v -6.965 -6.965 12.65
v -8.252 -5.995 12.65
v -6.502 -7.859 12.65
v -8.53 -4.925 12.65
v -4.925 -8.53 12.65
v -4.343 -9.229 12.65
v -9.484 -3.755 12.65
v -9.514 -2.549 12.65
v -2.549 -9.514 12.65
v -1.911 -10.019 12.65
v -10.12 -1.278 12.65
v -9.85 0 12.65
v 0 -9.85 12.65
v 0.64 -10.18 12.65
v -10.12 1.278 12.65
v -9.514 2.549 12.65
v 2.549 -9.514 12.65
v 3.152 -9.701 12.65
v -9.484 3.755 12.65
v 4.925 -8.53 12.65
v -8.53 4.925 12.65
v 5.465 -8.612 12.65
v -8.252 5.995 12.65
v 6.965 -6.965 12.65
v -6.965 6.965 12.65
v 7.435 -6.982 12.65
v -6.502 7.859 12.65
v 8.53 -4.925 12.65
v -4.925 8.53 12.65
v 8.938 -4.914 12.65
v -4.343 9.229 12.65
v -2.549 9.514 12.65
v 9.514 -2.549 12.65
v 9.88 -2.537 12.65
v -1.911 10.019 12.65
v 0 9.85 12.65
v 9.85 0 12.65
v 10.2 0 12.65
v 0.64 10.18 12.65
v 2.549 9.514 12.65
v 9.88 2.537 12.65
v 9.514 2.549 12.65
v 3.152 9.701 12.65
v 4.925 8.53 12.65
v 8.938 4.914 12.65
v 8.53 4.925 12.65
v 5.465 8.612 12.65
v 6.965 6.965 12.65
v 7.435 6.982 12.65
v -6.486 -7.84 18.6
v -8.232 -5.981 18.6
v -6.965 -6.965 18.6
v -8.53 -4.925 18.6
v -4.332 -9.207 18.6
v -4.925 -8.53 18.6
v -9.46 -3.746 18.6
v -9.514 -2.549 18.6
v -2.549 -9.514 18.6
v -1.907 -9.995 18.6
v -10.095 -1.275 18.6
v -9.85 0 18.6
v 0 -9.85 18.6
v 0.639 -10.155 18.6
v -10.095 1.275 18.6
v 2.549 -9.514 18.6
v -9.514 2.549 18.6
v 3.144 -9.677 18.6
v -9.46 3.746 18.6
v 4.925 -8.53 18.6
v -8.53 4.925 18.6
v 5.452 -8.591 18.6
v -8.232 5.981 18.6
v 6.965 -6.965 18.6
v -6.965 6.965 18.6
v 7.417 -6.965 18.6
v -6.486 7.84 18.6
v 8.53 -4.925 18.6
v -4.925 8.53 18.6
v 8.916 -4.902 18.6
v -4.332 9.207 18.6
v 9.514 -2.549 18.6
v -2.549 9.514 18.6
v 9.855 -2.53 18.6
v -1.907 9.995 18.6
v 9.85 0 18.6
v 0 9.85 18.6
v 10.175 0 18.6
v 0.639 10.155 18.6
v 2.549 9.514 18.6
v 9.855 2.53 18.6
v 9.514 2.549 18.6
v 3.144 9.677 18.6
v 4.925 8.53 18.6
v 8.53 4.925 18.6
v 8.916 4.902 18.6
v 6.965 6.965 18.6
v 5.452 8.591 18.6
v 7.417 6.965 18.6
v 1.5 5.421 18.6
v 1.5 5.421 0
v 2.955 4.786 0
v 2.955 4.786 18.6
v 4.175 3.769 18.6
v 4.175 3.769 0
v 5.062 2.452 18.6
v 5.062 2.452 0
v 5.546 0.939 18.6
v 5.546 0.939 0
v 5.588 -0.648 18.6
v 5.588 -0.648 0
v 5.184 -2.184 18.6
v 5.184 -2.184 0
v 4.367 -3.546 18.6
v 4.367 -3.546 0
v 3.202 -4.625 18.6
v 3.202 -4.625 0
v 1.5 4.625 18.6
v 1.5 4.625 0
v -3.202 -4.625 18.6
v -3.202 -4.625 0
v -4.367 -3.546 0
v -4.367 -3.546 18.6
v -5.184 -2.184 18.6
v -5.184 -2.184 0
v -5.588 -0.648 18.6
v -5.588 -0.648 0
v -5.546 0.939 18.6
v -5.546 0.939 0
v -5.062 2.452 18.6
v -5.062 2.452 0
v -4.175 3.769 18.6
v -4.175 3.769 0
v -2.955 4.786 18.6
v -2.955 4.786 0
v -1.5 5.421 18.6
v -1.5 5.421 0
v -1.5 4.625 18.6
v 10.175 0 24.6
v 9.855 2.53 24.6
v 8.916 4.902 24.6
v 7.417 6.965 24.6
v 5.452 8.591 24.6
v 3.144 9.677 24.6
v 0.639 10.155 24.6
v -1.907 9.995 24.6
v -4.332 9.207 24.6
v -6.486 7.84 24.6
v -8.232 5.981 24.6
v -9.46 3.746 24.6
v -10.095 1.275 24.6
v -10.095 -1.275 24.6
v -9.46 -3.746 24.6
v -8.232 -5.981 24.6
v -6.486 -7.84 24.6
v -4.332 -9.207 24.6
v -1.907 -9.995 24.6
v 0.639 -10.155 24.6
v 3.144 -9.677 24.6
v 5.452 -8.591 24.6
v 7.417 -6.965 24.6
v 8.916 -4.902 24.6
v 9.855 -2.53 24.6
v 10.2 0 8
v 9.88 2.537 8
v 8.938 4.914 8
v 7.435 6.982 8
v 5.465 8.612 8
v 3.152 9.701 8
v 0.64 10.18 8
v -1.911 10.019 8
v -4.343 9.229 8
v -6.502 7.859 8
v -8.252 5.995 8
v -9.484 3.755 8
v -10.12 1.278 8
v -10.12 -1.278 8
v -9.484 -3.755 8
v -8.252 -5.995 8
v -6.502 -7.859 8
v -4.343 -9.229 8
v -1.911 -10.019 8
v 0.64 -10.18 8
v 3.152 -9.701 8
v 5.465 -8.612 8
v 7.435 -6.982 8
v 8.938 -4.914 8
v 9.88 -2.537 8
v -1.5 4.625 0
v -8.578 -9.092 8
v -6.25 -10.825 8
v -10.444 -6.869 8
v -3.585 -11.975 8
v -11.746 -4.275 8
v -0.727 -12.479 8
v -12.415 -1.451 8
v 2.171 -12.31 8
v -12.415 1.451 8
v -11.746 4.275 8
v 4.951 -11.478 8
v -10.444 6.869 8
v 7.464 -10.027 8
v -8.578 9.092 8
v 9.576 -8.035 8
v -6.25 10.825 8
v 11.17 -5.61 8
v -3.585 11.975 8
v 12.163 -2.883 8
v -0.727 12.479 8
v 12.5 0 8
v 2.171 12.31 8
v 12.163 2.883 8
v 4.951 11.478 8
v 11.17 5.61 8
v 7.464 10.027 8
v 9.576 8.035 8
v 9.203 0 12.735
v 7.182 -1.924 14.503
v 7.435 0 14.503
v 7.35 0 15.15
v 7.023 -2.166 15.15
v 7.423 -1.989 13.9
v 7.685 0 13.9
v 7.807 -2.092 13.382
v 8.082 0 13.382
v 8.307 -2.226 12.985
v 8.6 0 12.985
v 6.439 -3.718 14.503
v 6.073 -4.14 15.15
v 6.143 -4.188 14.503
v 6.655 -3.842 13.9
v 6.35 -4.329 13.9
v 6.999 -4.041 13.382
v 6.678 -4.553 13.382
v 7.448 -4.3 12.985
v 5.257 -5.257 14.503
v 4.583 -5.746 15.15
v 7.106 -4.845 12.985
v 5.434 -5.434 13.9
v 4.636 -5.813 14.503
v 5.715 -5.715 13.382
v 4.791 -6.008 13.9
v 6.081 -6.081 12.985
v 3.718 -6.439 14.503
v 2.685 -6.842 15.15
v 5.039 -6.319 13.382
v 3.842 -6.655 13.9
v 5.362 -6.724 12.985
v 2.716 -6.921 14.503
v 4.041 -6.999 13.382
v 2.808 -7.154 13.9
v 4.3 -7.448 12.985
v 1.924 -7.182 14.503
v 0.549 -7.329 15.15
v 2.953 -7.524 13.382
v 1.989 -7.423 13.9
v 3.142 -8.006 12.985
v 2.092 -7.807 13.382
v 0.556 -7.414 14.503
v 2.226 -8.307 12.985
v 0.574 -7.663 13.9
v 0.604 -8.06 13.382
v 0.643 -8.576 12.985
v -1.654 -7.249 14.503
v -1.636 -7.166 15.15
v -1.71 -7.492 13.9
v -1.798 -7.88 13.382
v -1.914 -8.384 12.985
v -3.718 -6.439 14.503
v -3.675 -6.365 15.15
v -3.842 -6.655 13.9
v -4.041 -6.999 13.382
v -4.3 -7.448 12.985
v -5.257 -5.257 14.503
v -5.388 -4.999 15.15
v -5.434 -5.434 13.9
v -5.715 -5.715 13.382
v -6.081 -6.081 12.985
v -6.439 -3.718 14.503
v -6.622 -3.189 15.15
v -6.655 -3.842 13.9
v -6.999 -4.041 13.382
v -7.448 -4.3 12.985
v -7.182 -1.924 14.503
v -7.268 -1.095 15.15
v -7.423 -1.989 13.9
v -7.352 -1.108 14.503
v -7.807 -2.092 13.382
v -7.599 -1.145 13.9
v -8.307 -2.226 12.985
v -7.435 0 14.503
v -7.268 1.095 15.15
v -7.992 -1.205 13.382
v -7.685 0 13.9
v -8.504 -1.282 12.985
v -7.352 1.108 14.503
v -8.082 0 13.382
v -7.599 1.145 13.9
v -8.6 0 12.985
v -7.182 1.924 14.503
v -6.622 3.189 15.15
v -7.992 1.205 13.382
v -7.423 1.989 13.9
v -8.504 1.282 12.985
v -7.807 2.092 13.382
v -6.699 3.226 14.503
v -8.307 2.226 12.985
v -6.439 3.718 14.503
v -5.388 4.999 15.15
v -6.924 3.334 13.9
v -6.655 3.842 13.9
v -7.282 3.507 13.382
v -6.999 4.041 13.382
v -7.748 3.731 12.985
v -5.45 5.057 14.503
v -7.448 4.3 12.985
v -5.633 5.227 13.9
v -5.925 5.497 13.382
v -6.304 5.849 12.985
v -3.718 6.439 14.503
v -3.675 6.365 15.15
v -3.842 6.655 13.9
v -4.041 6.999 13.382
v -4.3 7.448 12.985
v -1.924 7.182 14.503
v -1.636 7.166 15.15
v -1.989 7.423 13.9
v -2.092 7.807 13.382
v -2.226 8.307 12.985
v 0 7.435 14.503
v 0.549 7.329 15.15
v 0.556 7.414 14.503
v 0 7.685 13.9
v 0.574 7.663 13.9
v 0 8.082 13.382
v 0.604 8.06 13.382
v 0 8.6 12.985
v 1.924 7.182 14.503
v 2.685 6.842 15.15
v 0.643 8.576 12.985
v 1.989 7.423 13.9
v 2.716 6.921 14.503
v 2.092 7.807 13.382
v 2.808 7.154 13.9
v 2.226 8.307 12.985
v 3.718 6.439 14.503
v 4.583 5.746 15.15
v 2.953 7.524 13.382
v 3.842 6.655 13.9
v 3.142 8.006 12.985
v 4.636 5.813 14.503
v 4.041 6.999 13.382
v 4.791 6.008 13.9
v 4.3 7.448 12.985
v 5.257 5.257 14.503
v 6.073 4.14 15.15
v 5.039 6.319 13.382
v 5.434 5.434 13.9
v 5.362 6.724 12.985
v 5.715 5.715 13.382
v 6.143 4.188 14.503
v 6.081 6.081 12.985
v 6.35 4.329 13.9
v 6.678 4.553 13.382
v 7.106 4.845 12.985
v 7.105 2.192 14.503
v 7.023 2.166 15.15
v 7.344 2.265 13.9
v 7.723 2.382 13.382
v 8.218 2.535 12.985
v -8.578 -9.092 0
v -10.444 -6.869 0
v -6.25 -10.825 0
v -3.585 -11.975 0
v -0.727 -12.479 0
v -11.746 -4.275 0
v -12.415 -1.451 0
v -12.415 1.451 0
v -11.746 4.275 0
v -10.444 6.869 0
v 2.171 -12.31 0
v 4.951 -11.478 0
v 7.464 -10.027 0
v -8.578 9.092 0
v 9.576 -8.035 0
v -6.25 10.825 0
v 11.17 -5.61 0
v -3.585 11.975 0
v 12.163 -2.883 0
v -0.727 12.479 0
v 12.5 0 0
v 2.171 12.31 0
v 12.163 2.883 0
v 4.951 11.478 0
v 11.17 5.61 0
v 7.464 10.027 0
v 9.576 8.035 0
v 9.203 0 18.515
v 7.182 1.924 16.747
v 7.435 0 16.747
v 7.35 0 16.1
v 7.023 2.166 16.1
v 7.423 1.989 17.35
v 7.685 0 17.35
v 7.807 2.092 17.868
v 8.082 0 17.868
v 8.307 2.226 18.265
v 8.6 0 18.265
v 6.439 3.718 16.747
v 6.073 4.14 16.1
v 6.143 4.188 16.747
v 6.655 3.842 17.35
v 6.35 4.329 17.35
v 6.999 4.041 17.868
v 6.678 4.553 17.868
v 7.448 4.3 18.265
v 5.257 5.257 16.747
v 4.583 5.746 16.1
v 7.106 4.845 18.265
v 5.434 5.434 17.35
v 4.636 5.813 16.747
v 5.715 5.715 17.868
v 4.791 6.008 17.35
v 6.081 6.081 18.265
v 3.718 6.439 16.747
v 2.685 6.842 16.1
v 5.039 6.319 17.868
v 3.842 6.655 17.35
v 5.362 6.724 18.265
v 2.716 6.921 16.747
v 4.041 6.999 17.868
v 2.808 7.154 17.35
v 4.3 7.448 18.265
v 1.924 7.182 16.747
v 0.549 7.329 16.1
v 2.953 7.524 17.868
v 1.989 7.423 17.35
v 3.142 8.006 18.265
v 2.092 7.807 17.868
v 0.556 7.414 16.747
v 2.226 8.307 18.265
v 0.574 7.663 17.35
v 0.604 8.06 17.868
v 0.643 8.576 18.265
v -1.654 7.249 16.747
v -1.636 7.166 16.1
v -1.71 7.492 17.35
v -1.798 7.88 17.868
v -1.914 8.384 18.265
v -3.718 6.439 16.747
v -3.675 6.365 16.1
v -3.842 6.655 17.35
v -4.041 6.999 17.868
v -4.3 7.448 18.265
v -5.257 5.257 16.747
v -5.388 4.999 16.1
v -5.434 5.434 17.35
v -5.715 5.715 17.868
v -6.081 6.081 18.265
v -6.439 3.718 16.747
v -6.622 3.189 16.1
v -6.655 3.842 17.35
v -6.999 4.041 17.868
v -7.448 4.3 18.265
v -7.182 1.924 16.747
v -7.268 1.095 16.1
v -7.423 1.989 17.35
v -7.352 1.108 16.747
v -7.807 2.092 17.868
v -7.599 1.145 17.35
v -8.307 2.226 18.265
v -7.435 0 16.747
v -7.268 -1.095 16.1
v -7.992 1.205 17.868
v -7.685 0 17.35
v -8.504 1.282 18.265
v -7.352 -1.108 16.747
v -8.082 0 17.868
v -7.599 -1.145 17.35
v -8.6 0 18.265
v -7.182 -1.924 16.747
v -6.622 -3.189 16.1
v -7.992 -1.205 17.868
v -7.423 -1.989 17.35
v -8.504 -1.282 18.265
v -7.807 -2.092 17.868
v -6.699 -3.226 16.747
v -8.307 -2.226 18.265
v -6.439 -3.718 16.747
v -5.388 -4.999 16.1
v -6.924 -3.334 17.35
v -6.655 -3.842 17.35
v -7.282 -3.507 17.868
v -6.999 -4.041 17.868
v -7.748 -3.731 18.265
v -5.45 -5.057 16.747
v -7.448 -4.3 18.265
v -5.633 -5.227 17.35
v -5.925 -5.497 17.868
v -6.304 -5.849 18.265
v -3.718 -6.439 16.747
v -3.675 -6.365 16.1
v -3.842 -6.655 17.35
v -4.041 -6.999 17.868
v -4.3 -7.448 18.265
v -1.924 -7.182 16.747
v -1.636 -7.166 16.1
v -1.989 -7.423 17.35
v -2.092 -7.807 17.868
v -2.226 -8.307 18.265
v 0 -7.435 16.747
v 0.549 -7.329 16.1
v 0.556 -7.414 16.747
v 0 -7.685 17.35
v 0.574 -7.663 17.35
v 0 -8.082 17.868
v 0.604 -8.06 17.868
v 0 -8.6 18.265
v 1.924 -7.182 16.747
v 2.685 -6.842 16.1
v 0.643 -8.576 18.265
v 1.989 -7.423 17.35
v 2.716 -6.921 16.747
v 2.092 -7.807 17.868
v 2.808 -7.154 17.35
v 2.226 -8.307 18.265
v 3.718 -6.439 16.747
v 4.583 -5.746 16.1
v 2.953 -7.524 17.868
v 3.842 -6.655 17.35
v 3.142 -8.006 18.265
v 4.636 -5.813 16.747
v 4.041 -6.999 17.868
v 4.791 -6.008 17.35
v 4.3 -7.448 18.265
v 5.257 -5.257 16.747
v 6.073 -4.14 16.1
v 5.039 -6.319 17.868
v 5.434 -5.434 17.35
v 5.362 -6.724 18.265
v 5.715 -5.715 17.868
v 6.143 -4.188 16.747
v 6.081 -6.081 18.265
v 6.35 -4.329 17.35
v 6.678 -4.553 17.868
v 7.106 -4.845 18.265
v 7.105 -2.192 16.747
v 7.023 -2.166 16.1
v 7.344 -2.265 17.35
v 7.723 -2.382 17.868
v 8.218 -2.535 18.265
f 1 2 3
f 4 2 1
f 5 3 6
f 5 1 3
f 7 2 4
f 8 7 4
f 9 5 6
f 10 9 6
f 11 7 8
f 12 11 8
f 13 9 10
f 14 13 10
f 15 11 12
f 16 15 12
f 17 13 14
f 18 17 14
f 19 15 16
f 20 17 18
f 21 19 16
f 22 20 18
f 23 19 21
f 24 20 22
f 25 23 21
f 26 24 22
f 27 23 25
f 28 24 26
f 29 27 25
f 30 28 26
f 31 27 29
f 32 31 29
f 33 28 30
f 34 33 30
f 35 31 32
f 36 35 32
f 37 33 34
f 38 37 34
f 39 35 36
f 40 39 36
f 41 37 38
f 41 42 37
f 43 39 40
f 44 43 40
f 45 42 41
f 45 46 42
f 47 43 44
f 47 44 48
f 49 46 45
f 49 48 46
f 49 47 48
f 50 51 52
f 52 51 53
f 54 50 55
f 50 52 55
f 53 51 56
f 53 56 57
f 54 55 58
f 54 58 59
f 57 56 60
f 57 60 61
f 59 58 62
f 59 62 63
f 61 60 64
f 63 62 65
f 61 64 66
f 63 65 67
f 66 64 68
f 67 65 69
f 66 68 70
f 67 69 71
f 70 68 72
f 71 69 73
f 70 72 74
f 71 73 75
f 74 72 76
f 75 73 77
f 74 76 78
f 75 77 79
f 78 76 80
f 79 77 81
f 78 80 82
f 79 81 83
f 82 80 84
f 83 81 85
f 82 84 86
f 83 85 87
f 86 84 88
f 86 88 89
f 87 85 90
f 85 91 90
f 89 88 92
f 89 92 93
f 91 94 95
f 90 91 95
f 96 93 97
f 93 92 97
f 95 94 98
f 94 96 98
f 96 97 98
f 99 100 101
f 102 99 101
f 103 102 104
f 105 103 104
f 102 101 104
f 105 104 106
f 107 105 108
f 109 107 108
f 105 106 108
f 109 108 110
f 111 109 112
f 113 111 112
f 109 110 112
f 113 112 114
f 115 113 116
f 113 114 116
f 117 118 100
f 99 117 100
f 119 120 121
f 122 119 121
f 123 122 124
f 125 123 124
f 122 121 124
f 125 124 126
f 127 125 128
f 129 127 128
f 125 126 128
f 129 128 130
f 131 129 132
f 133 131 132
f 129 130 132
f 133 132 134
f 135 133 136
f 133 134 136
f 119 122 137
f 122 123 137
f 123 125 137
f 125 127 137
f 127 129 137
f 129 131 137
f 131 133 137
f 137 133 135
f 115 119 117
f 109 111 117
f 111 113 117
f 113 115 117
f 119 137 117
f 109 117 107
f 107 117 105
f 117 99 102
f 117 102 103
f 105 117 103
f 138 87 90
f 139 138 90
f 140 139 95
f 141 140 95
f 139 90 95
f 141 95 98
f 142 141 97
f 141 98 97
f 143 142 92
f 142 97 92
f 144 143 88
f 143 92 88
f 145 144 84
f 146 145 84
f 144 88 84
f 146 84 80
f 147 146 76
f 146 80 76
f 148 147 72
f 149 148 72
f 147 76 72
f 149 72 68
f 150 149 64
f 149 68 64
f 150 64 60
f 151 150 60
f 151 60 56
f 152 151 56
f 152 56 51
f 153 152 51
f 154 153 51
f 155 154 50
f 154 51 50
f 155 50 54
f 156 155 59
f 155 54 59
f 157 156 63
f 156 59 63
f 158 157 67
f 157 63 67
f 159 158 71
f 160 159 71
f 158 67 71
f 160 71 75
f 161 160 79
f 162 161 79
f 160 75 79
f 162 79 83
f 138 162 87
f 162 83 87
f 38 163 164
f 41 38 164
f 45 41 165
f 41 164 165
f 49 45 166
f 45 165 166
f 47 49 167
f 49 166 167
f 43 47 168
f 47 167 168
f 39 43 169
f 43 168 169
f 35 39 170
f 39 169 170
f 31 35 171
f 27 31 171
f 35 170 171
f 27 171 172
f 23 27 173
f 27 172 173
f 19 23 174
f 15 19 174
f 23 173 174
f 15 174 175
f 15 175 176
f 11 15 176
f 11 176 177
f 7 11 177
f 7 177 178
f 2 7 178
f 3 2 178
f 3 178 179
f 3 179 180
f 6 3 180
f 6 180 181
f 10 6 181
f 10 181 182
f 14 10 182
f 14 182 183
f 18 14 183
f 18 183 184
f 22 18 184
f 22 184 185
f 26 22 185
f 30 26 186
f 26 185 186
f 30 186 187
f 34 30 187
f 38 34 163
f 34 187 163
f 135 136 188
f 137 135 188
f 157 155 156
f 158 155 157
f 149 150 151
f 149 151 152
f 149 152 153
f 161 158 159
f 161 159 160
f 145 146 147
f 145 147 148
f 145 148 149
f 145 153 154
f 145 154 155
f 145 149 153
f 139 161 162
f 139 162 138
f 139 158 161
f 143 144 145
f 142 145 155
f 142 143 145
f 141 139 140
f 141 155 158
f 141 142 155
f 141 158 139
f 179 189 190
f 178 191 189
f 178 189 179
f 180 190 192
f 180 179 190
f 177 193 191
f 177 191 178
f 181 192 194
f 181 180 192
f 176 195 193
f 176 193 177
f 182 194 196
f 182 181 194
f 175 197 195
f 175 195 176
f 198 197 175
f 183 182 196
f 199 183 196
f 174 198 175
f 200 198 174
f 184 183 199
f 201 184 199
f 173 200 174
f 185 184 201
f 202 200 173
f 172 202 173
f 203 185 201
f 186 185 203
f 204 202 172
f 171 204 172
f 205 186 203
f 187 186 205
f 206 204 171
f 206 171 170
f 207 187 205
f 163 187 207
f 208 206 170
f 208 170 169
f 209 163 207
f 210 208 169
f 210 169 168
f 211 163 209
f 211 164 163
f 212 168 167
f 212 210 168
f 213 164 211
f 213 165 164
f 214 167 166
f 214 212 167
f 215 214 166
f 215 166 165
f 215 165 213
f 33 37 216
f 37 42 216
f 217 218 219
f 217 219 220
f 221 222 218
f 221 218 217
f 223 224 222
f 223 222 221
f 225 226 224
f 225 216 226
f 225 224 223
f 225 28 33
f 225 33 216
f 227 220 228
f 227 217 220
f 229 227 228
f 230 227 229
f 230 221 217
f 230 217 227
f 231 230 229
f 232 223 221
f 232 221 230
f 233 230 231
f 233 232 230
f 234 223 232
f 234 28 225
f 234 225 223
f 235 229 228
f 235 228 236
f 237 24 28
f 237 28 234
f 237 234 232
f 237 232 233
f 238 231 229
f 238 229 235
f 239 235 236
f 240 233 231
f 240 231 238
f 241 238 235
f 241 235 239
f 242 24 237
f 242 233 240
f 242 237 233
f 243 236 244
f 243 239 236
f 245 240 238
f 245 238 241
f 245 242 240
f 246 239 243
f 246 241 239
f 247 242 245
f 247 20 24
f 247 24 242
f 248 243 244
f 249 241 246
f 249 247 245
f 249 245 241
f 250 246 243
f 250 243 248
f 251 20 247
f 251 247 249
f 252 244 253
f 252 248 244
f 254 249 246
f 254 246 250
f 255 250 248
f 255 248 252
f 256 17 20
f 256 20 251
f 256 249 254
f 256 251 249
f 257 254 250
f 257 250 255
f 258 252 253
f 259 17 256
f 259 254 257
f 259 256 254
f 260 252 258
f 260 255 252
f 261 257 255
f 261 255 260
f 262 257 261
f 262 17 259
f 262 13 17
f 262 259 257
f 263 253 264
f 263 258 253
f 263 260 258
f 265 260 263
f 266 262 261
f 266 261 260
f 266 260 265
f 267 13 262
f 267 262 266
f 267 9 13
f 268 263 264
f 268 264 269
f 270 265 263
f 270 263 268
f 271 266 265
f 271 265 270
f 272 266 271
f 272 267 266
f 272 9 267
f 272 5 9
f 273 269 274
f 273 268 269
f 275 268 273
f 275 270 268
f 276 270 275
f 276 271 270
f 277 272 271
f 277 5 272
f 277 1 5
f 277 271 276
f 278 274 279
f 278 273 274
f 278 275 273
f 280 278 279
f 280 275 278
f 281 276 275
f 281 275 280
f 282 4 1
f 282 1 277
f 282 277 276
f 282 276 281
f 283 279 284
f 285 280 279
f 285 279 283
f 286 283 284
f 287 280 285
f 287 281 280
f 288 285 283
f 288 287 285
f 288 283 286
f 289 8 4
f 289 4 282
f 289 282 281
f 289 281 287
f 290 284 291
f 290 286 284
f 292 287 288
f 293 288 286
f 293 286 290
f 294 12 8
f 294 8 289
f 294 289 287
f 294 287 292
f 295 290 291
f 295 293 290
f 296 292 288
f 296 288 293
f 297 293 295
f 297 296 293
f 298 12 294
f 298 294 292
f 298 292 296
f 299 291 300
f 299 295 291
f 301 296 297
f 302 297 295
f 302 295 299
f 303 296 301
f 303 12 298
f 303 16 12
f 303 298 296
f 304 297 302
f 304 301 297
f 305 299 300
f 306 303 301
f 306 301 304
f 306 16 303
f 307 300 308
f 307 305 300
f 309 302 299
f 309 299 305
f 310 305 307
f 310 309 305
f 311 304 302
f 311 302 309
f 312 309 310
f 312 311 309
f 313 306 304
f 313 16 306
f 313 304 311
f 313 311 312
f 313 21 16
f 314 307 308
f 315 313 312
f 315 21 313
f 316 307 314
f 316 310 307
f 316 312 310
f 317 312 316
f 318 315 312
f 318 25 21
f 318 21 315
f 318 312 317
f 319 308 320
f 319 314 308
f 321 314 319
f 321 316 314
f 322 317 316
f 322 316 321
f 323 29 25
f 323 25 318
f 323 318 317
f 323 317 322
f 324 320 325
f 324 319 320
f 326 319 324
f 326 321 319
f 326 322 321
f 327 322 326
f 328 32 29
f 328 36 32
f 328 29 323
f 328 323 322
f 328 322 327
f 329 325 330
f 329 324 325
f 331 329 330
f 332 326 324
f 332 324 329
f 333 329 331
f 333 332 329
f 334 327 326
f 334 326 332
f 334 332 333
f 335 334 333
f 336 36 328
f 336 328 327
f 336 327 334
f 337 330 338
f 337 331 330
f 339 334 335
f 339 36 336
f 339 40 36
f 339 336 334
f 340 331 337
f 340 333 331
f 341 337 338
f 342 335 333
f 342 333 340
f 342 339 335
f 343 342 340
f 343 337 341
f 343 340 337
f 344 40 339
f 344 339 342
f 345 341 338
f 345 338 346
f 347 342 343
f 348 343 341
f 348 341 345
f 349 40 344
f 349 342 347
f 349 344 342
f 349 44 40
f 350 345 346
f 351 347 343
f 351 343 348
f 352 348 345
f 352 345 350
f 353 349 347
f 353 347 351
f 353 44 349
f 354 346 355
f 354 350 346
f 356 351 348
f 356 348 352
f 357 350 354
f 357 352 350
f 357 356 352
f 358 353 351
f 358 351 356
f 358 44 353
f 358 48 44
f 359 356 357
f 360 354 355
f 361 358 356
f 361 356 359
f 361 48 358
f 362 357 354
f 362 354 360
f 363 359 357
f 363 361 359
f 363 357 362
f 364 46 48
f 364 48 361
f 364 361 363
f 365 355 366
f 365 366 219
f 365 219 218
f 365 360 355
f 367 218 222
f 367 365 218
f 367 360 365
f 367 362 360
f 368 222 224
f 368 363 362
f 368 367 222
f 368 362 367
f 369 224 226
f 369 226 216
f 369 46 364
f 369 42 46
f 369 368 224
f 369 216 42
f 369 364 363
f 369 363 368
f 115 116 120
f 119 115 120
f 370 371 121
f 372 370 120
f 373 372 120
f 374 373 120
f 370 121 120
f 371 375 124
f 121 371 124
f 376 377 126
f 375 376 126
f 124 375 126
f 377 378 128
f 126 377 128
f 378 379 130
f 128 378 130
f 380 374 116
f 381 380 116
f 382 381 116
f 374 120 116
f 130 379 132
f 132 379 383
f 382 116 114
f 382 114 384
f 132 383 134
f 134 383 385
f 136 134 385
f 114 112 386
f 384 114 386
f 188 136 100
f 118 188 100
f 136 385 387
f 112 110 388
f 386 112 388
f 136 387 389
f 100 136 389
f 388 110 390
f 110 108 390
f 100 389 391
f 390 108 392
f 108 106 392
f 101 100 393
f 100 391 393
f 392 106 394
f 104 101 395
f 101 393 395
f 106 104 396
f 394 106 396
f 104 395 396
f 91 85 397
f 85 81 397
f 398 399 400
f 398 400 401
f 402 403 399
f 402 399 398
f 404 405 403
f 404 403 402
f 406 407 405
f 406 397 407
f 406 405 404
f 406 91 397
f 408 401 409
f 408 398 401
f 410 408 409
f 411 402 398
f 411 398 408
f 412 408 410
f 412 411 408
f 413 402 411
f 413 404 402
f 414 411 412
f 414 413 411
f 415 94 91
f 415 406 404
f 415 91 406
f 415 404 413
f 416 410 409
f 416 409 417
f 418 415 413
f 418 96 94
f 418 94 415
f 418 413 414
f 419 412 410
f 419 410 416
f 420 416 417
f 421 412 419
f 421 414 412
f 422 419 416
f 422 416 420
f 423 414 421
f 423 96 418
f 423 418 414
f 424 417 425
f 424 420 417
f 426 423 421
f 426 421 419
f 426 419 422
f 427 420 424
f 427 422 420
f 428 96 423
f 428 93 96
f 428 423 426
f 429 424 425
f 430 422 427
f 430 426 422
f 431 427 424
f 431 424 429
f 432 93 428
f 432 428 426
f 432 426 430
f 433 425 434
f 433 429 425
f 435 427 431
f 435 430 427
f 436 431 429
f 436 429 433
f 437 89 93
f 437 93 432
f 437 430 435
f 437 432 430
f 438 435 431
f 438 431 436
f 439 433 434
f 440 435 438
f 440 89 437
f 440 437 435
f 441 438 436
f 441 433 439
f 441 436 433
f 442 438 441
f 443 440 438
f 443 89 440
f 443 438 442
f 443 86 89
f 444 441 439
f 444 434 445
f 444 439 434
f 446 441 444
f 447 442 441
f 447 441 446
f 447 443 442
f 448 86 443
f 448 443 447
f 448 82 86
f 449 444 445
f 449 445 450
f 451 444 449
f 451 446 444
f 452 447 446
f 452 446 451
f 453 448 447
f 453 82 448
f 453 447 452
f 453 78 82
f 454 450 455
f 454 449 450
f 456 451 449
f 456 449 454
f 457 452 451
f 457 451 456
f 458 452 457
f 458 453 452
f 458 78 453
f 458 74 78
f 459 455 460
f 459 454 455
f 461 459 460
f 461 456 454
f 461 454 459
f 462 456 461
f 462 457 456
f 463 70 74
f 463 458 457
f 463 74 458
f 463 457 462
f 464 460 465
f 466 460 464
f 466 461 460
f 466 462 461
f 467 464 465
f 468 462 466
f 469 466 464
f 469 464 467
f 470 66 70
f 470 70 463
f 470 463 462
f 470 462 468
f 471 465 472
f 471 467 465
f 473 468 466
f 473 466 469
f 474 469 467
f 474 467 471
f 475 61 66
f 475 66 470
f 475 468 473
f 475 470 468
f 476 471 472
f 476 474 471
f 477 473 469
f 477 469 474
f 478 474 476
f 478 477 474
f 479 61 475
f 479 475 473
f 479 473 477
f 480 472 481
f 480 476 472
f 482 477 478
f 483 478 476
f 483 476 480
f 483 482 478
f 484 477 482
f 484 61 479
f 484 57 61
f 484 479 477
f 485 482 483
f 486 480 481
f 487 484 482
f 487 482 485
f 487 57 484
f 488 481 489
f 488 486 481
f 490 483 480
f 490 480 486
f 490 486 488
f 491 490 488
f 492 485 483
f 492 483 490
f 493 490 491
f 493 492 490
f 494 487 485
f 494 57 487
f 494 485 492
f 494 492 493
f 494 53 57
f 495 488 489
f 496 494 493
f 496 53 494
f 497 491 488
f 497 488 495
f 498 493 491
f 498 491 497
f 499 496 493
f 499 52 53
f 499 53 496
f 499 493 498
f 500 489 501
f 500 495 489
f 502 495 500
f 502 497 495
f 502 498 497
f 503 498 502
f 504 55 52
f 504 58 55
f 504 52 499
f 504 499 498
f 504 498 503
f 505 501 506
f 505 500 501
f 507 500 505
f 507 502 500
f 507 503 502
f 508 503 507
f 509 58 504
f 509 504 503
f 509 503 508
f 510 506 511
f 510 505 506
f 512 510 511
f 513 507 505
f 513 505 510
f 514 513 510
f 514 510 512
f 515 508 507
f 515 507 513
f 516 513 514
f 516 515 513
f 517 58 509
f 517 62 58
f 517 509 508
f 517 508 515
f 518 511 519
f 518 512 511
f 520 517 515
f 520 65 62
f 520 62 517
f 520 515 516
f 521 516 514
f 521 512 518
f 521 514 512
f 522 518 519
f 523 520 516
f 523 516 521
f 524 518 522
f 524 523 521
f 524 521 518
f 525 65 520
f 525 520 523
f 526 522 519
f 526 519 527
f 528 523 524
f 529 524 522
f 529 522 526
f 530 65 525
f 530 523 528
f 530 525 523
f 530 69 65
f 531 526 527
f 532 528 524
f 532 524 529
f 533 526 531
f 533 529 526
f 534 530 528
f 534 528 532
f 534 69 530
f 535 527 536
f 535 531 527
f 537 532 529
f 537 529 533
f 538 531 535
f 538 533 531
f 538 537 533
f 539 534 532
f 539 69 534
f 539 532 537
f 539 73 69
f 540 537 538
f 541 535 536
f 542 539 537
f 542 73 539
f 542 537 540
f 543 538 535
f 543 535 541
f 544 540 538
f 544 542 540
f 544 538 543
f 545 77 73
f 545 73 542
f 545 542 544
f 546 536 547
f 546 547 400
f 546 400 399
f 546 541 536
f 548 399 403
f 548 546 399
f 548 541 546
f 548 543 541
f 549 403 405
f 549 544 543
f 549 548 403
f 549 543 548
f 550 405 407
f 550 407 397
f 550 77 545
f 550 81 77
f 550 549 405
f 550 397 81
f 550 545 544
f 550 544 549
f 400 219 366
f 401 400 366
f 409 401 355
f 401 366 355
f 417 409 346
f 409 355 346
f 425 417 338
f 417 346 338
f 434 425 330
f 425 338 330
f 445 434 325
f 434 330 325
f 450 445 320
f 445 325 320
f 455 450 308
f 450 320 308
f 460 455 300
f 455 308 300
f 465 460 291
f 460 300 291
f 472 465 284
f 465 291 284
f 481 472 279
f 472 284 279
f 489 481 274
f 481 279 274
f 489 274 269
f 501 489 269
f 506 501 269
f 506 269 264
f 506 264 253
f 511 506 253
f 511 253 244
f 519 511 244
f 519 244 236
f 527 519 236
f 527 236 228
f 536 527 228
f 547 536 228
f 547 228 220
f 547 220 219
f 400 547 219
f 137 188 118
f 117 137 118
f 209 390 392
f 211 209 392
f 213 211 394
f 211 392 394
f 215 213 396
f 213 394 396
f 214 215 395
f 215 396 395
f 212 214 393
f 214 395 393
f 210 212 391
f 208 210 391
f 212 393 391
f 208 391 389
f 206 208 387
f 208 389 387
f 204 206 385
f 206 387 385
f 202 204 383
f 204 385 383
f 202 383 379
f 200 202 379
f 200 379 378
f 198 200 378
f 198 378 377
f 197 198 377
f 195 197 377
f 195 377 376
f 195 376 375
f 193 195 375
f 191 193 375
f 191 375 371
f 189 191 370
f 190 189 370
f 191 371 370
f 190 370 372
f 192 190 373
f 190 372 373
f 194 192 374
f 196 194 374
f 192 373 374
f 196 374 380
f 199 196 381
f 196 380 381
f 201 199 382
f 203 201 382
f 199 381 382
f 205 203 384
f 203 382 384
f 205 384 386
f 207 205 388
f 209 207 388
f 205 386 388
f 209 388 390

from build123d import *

# Parameters (mm, degrees)
F0_R     = 12.5
F0_R_2   = 10.2
F0_R_3   = 7.35
F1_DEPTH = 8
F2_DEPTH = 12.65
F3_DEPTH = 18.6
F4_R     = 10.175
F5_DEPTH = 6
F6_R     = 2.5
F7_R     = 2.5


with BuildPart() as f1:
    # F0 (on Top) → F1 (new body)
    with BuildSketch(Plane.XY):
        Circle(F0_R)
        Circle(F0_R_2, mode=Mode.SUBTRACT)
        Circle(F0_R_2)
        Circle(F0_R_3, mode=Mode.SUBTRACT)
        Circle(F0_R_3)
        with BuildLine():
            ThreePointArc((1.5, 5.4213121106), (5.5460137346, 0.9393384136), (3.2015621187, -4.625))
            Line((3.2015621187, -4.625), (-3.2015621187, -4.625))
            ThreePointArc((-3.2015621187, -4.625), (-5.5460137346, 0.9393384136), (-1.5, 5.4213121106))
            Line((-1.5, 5.4213121106), (-1.5, 4.625))
            Line((-1.5, 4.625), (1.5, 4.625))
            Line((1.5, 4.625), (1.5, 5.4213121106))
        make_face(mode=Mode.SUBTRACT)
    extrude(amount=F1_DEPTH)

    # F0 (on Top) → F2 (join)
    with BuildSketch(Plane.XY):
        Circle(F0_R_2)
        Circle(F0_R_3, mode=Mode.SUBTRACT)
        Circle(F0_R_3)
        with BuildLine():
            ThreePointArc((1.5, 5.4213121106), (5.5460137346, 0.9393384136), (3.2015621187, -4.625))
            Line((3.2015621187, -4.625), (-3.2015621187, -4.625))
            ThreePointArc((-3.2015621187, -4.625), (-5.5460137346, 0.9393384136), (-1.5, 5.4213121106))
            Line((-1.5, 5.4213121106), (-1.5, 4.625))
            Line((-1.5, 4.625), (1.5, 4.625))
            Line((1.5, 4.625), (1.5, 5.4213121106))
        make_face(mode=Mode.SUBTRACT)
    extrude(amount=F2_DEPTH)

    # F0 (on Top) → F3 (join)
    with BuildSketch(Plane.XY):
        Circle(F0_R_3)
        with BuildLine():
            ThreePointArc((1.5, 5.4213121106), (5.5460137346, 0.9393384136), (3.2015621187, -4.625))
            Line((3.2015621187, -4.625), (-3.2015621187, -4.625))
            ThreePointArc((-3.2015621187, -4.625), (-5.5460137346, 0.9393384136), (-1.5, 5.4213121106))
            Line((-1.5, 5.4213121106), (-1.5, 4.625))
            Line((-1.5, 4.625), (1.5, 4.625))
            Line((1.5, 4.625), (1.5, 5.4213121106))
        make_face(mode=Mode.SUBTRACT)
    extrude(amount=F3_DEPTH)

    # F4 (on face) → F5 (join)
    with BuildSketch(Plane.XY.offset(18.6)):
        Circle(F4_R)
    extrude(amount=F5_DEPTH)

    # F6
    f6_edges = [f1.edges().sort_by_distance(p)[0] for p in [
        (-7.35, 0, 12.65),
    ]]
    fillet(f6_edges, radius=F6_R)

    # F7
    f7_edges = [f1.edges().sort_by_distance(p)[0] for p in [
        (-7.35, 0, 18.6),
    ]]
    fillet(f7_edges, radius=F7_R)


solid = f1.part
